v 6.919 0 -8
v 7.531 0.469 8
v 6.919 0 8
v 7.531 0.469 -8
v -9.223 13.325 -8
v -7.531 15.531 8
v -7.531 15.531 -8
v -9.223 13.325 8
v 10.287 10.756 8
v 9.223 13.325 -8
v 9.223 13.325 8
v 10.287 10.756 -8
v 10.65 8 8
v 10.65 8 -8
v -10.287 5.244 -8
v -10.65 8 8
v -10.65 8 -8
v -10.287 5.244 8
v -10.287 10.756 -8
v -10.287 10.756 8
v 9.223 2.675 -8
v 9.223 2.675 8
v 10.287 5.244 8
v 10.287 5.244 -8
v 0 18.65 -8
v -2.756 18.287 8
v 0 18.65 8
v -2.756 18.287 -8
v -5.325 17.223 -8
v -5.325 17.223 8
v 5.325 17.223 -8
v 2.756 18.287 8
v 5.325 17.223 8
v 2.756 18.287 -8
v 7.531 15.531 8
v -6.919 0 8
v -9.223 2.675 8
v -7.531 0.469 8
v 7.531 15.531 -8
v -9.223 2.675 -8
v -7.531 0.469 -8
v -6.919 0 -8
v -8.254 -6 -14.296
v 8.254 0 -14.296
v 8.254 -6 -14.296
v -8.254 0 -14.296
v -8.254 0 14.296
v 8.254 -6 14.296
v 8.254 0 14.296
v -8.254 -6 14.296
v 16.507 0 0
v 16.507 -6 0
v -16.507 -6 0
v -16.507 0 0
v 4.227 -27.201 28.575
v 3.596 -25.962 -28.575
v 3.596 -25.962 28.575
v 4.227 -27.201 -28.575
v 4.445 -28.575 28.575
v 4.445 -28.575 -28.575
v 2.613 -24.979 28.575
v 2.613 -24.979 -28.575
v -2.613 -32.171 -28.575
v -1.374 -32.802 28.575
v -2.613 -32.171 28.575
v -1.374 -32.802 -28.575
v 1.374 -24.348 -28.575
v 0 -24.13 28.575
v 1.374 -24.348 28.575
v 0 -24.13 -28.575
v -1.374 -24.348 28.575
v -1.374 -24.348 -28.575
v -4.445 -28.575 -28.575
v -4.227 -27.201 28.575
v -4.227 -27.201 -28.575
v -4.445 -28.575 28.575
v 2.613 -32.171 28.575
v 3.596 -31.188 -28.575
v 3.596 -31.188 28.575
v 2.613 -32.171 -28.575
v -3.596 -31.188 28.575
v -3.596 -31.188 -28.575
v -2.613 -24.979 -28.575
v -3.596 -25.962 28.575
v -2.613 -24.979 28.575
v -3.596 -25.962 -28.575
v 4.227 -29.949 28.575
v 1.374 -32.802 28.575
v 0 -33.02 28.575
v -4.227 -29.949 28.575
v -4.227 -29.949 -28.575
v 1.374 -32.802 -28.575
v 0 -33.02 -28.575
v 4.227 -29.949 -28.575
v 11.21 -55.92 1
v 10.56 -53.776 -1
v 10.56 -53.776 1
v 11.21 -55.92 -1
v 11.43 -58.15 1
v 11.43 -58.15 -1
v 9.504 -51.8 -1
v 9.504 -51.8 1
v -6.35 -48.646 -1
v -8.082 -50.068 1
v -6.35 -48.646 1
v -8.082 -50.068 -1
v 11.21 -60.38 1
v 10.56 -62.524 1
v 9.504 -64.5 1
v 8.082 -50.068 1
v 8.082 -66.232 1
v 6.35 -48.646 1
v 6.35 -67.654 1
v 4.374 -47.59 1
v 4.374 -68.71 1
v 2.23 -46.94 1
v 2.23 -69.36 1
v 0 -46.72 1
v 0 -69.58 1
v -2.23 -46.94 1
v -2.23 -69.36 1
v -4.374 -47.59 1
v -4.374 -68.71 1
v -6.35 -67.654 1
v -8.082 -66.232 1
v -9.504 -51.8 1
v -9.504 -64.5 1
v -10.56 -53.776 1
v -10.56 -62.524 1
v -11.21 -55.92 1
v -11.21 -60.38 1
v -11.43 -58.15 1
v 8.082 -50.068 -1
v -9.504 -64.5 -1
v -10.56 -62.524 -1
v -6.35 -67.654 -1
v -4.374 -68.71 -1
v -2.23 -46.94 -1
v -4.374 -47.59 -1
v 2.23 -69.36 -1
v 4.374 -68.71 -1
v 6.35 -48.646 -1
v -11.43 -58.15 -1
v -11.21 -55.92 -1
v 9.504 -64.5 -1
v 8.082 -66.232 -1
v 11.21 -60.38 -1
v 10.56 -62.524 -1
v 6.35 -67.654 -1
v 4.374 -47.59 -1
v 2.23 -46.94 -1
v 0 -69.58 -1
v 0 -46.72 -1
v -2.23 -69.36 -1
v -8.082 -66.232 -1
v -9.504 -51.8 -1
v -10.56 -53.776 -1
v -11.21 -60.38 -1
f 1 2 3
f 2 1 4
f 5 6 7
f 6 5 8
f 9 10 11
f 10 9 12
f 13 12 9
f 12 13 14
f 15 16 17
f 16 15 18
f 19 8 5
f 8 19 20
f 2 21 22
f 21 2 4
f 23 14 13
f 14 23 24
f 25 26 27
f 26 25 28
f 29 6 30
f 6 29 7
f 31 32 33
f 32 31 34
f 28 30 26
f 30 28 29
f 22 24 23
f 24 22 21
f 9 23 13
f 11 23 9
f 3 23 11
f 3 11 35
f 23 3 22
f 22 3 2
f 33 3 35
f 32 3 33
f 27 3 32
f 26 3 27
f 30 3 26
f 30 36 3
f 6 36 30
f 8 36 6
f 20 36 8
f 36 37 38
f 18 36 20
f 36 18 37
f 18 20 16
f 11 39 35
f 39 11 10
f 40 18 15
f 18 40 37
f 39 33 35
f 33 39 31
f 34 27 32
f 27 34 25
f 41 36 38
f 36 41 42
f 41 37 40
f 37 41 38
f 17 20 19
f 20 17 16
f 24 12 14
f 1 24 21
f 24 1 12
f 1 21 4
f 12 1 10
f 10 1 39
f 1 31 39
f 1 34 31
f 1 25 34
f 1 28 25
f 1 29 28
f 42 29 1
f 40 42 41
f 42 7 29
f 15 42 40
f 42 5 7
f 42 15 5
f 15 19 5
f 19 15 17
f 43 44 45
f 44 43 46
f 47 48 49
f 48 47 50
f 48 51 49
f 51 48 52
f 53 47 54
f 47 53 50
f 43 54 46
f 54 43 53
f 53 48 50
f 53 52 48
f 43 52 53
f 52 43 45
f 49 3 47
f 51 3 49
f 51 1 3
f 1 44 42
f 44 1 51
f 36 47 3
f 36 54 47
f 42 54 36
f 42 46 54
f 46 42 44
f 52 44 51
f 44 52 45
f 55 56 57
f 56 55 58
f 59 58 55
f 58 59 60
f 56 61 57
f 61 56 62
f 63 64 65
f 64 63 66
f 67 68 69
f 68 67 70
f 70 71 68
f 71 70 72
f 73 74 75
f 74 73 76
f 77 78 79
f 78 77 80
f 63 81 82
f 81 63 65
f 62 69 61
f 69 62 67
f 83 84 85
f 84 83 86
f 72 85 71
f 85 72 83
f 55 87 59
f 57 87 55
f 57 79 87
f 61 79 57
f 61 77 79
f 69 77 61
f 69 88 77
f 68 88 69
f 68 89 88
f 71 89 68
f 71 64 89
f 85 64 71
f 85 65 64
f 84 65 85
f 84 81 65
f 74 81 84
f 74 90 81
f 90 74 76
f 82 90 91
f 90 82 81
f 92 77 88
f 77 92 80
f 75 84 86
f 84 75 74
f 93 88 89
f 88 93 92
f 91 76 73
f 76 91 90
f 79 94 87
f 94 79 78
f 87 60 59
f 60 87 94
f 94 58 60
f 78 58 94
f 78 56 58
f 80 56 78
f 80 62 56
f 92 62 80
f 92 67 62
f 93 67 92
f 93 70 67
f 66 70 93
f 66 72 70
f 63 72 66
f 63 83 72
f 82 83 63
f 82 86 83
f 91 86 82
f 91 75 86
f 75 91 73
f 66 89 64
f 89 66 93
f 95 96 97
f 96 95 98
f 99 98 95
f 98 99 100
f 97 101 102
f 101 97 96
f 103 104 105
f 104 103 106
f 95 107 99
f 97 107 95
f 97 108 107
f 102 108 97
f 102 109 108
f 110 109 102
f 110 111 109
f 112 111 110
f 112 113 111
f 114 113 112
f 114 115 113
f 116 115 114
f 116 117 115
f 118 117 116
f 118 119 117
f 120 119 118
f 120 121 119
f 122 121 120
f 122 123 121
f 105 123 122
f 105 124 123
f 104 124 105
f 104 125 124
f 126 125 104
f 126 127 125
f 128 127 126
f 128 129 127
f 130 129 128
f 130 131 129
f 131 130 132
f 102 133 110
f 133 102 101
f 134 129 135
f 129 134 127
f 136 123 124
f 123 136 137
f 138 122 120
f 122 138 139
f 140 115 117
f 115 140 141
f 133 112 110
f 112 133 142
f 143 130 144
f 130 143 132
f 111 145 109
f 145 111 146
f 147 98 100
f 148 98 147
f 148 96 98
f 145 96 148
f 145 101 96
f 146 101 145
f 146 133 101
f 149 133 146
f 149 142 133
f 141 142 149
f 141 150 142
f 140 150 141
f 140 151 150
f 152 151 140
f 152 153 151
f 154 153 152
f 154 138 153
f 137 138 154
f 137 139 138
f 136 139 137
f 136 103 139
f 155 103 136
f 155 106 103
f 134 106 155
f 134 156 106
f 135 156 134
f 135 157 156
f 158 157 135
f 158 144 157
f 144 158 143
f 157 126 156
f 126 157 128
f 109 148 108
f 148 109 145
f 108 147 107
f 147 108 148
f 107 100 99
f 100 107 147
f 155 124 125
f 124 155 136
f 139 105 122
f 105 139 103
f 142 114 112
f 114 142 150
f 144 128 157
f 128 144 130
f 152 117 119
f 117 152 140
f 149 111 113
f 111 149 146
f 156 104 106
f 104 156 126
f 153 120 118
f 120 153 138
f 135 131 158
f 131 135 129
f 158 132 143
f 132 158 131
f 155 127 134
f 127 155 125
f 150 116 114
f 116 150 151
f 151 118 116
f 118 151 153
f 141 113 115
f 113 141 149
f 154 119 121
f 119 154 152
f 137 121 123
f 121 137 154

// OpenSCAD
// Auto-generated by scripts/author_from_manifest.py (Phase D.3).
// Source: data/phase_d_manifest.json (sku_intent='viking-vk457-concealed-175f').
// Do not hand-edit — regenerate from the manifest.
//
// @part viking_vk457_concealed_175f
// @kind sprinkler_head
// @category head.pendant.k56
// @display-name "Viking VK457 Concealed Pendent K5.6 175°F"
// @mfg viking_group
// @mfg-pn VK457
// @listing UL FM
// @hazard-classes LH OH1
// @price-usd 27.40
// @install-minutes 10
// @crew journeyman
// @k-factor 5.6
// @orientation pendant
// @response quick
// @temperature 175F
// @param size_in number default=0.5 label="Size" unit="in"
// @port inlet position=[0,0.014,0] direction=[0,1,0] style=NPT_threaded size_in=0.5 role=drop

size_in = 0.5;
k_factor = 5.6;

length_mm   = 57.15;
body_dia_mm = 25.40;
thread_od   = 21.3;
thread_len  = 16;
deflector_d = body_dia_mm * 0.9;

 union() {
    translate([0, thread_len/2, 0])
        cylinder(h = thread_len, d = thread_od, center = true, $fn = 24);
    translate([0, -3, 0])
        rotate([90, 0, 0])
        cylinder(h = 6, d = thread_od * 1.55, $fn = 6, center = true);
    translate([0, -length_mm/2, 0])
        cylinder(h = length_mm, d = body_dia_mm * 0.35, center = true, $fn = 20);
    translate([0, -length_mm - 1, 0])
        cylinder(h = 2, d = deflector_d, center = true, $fn = 32);
}
